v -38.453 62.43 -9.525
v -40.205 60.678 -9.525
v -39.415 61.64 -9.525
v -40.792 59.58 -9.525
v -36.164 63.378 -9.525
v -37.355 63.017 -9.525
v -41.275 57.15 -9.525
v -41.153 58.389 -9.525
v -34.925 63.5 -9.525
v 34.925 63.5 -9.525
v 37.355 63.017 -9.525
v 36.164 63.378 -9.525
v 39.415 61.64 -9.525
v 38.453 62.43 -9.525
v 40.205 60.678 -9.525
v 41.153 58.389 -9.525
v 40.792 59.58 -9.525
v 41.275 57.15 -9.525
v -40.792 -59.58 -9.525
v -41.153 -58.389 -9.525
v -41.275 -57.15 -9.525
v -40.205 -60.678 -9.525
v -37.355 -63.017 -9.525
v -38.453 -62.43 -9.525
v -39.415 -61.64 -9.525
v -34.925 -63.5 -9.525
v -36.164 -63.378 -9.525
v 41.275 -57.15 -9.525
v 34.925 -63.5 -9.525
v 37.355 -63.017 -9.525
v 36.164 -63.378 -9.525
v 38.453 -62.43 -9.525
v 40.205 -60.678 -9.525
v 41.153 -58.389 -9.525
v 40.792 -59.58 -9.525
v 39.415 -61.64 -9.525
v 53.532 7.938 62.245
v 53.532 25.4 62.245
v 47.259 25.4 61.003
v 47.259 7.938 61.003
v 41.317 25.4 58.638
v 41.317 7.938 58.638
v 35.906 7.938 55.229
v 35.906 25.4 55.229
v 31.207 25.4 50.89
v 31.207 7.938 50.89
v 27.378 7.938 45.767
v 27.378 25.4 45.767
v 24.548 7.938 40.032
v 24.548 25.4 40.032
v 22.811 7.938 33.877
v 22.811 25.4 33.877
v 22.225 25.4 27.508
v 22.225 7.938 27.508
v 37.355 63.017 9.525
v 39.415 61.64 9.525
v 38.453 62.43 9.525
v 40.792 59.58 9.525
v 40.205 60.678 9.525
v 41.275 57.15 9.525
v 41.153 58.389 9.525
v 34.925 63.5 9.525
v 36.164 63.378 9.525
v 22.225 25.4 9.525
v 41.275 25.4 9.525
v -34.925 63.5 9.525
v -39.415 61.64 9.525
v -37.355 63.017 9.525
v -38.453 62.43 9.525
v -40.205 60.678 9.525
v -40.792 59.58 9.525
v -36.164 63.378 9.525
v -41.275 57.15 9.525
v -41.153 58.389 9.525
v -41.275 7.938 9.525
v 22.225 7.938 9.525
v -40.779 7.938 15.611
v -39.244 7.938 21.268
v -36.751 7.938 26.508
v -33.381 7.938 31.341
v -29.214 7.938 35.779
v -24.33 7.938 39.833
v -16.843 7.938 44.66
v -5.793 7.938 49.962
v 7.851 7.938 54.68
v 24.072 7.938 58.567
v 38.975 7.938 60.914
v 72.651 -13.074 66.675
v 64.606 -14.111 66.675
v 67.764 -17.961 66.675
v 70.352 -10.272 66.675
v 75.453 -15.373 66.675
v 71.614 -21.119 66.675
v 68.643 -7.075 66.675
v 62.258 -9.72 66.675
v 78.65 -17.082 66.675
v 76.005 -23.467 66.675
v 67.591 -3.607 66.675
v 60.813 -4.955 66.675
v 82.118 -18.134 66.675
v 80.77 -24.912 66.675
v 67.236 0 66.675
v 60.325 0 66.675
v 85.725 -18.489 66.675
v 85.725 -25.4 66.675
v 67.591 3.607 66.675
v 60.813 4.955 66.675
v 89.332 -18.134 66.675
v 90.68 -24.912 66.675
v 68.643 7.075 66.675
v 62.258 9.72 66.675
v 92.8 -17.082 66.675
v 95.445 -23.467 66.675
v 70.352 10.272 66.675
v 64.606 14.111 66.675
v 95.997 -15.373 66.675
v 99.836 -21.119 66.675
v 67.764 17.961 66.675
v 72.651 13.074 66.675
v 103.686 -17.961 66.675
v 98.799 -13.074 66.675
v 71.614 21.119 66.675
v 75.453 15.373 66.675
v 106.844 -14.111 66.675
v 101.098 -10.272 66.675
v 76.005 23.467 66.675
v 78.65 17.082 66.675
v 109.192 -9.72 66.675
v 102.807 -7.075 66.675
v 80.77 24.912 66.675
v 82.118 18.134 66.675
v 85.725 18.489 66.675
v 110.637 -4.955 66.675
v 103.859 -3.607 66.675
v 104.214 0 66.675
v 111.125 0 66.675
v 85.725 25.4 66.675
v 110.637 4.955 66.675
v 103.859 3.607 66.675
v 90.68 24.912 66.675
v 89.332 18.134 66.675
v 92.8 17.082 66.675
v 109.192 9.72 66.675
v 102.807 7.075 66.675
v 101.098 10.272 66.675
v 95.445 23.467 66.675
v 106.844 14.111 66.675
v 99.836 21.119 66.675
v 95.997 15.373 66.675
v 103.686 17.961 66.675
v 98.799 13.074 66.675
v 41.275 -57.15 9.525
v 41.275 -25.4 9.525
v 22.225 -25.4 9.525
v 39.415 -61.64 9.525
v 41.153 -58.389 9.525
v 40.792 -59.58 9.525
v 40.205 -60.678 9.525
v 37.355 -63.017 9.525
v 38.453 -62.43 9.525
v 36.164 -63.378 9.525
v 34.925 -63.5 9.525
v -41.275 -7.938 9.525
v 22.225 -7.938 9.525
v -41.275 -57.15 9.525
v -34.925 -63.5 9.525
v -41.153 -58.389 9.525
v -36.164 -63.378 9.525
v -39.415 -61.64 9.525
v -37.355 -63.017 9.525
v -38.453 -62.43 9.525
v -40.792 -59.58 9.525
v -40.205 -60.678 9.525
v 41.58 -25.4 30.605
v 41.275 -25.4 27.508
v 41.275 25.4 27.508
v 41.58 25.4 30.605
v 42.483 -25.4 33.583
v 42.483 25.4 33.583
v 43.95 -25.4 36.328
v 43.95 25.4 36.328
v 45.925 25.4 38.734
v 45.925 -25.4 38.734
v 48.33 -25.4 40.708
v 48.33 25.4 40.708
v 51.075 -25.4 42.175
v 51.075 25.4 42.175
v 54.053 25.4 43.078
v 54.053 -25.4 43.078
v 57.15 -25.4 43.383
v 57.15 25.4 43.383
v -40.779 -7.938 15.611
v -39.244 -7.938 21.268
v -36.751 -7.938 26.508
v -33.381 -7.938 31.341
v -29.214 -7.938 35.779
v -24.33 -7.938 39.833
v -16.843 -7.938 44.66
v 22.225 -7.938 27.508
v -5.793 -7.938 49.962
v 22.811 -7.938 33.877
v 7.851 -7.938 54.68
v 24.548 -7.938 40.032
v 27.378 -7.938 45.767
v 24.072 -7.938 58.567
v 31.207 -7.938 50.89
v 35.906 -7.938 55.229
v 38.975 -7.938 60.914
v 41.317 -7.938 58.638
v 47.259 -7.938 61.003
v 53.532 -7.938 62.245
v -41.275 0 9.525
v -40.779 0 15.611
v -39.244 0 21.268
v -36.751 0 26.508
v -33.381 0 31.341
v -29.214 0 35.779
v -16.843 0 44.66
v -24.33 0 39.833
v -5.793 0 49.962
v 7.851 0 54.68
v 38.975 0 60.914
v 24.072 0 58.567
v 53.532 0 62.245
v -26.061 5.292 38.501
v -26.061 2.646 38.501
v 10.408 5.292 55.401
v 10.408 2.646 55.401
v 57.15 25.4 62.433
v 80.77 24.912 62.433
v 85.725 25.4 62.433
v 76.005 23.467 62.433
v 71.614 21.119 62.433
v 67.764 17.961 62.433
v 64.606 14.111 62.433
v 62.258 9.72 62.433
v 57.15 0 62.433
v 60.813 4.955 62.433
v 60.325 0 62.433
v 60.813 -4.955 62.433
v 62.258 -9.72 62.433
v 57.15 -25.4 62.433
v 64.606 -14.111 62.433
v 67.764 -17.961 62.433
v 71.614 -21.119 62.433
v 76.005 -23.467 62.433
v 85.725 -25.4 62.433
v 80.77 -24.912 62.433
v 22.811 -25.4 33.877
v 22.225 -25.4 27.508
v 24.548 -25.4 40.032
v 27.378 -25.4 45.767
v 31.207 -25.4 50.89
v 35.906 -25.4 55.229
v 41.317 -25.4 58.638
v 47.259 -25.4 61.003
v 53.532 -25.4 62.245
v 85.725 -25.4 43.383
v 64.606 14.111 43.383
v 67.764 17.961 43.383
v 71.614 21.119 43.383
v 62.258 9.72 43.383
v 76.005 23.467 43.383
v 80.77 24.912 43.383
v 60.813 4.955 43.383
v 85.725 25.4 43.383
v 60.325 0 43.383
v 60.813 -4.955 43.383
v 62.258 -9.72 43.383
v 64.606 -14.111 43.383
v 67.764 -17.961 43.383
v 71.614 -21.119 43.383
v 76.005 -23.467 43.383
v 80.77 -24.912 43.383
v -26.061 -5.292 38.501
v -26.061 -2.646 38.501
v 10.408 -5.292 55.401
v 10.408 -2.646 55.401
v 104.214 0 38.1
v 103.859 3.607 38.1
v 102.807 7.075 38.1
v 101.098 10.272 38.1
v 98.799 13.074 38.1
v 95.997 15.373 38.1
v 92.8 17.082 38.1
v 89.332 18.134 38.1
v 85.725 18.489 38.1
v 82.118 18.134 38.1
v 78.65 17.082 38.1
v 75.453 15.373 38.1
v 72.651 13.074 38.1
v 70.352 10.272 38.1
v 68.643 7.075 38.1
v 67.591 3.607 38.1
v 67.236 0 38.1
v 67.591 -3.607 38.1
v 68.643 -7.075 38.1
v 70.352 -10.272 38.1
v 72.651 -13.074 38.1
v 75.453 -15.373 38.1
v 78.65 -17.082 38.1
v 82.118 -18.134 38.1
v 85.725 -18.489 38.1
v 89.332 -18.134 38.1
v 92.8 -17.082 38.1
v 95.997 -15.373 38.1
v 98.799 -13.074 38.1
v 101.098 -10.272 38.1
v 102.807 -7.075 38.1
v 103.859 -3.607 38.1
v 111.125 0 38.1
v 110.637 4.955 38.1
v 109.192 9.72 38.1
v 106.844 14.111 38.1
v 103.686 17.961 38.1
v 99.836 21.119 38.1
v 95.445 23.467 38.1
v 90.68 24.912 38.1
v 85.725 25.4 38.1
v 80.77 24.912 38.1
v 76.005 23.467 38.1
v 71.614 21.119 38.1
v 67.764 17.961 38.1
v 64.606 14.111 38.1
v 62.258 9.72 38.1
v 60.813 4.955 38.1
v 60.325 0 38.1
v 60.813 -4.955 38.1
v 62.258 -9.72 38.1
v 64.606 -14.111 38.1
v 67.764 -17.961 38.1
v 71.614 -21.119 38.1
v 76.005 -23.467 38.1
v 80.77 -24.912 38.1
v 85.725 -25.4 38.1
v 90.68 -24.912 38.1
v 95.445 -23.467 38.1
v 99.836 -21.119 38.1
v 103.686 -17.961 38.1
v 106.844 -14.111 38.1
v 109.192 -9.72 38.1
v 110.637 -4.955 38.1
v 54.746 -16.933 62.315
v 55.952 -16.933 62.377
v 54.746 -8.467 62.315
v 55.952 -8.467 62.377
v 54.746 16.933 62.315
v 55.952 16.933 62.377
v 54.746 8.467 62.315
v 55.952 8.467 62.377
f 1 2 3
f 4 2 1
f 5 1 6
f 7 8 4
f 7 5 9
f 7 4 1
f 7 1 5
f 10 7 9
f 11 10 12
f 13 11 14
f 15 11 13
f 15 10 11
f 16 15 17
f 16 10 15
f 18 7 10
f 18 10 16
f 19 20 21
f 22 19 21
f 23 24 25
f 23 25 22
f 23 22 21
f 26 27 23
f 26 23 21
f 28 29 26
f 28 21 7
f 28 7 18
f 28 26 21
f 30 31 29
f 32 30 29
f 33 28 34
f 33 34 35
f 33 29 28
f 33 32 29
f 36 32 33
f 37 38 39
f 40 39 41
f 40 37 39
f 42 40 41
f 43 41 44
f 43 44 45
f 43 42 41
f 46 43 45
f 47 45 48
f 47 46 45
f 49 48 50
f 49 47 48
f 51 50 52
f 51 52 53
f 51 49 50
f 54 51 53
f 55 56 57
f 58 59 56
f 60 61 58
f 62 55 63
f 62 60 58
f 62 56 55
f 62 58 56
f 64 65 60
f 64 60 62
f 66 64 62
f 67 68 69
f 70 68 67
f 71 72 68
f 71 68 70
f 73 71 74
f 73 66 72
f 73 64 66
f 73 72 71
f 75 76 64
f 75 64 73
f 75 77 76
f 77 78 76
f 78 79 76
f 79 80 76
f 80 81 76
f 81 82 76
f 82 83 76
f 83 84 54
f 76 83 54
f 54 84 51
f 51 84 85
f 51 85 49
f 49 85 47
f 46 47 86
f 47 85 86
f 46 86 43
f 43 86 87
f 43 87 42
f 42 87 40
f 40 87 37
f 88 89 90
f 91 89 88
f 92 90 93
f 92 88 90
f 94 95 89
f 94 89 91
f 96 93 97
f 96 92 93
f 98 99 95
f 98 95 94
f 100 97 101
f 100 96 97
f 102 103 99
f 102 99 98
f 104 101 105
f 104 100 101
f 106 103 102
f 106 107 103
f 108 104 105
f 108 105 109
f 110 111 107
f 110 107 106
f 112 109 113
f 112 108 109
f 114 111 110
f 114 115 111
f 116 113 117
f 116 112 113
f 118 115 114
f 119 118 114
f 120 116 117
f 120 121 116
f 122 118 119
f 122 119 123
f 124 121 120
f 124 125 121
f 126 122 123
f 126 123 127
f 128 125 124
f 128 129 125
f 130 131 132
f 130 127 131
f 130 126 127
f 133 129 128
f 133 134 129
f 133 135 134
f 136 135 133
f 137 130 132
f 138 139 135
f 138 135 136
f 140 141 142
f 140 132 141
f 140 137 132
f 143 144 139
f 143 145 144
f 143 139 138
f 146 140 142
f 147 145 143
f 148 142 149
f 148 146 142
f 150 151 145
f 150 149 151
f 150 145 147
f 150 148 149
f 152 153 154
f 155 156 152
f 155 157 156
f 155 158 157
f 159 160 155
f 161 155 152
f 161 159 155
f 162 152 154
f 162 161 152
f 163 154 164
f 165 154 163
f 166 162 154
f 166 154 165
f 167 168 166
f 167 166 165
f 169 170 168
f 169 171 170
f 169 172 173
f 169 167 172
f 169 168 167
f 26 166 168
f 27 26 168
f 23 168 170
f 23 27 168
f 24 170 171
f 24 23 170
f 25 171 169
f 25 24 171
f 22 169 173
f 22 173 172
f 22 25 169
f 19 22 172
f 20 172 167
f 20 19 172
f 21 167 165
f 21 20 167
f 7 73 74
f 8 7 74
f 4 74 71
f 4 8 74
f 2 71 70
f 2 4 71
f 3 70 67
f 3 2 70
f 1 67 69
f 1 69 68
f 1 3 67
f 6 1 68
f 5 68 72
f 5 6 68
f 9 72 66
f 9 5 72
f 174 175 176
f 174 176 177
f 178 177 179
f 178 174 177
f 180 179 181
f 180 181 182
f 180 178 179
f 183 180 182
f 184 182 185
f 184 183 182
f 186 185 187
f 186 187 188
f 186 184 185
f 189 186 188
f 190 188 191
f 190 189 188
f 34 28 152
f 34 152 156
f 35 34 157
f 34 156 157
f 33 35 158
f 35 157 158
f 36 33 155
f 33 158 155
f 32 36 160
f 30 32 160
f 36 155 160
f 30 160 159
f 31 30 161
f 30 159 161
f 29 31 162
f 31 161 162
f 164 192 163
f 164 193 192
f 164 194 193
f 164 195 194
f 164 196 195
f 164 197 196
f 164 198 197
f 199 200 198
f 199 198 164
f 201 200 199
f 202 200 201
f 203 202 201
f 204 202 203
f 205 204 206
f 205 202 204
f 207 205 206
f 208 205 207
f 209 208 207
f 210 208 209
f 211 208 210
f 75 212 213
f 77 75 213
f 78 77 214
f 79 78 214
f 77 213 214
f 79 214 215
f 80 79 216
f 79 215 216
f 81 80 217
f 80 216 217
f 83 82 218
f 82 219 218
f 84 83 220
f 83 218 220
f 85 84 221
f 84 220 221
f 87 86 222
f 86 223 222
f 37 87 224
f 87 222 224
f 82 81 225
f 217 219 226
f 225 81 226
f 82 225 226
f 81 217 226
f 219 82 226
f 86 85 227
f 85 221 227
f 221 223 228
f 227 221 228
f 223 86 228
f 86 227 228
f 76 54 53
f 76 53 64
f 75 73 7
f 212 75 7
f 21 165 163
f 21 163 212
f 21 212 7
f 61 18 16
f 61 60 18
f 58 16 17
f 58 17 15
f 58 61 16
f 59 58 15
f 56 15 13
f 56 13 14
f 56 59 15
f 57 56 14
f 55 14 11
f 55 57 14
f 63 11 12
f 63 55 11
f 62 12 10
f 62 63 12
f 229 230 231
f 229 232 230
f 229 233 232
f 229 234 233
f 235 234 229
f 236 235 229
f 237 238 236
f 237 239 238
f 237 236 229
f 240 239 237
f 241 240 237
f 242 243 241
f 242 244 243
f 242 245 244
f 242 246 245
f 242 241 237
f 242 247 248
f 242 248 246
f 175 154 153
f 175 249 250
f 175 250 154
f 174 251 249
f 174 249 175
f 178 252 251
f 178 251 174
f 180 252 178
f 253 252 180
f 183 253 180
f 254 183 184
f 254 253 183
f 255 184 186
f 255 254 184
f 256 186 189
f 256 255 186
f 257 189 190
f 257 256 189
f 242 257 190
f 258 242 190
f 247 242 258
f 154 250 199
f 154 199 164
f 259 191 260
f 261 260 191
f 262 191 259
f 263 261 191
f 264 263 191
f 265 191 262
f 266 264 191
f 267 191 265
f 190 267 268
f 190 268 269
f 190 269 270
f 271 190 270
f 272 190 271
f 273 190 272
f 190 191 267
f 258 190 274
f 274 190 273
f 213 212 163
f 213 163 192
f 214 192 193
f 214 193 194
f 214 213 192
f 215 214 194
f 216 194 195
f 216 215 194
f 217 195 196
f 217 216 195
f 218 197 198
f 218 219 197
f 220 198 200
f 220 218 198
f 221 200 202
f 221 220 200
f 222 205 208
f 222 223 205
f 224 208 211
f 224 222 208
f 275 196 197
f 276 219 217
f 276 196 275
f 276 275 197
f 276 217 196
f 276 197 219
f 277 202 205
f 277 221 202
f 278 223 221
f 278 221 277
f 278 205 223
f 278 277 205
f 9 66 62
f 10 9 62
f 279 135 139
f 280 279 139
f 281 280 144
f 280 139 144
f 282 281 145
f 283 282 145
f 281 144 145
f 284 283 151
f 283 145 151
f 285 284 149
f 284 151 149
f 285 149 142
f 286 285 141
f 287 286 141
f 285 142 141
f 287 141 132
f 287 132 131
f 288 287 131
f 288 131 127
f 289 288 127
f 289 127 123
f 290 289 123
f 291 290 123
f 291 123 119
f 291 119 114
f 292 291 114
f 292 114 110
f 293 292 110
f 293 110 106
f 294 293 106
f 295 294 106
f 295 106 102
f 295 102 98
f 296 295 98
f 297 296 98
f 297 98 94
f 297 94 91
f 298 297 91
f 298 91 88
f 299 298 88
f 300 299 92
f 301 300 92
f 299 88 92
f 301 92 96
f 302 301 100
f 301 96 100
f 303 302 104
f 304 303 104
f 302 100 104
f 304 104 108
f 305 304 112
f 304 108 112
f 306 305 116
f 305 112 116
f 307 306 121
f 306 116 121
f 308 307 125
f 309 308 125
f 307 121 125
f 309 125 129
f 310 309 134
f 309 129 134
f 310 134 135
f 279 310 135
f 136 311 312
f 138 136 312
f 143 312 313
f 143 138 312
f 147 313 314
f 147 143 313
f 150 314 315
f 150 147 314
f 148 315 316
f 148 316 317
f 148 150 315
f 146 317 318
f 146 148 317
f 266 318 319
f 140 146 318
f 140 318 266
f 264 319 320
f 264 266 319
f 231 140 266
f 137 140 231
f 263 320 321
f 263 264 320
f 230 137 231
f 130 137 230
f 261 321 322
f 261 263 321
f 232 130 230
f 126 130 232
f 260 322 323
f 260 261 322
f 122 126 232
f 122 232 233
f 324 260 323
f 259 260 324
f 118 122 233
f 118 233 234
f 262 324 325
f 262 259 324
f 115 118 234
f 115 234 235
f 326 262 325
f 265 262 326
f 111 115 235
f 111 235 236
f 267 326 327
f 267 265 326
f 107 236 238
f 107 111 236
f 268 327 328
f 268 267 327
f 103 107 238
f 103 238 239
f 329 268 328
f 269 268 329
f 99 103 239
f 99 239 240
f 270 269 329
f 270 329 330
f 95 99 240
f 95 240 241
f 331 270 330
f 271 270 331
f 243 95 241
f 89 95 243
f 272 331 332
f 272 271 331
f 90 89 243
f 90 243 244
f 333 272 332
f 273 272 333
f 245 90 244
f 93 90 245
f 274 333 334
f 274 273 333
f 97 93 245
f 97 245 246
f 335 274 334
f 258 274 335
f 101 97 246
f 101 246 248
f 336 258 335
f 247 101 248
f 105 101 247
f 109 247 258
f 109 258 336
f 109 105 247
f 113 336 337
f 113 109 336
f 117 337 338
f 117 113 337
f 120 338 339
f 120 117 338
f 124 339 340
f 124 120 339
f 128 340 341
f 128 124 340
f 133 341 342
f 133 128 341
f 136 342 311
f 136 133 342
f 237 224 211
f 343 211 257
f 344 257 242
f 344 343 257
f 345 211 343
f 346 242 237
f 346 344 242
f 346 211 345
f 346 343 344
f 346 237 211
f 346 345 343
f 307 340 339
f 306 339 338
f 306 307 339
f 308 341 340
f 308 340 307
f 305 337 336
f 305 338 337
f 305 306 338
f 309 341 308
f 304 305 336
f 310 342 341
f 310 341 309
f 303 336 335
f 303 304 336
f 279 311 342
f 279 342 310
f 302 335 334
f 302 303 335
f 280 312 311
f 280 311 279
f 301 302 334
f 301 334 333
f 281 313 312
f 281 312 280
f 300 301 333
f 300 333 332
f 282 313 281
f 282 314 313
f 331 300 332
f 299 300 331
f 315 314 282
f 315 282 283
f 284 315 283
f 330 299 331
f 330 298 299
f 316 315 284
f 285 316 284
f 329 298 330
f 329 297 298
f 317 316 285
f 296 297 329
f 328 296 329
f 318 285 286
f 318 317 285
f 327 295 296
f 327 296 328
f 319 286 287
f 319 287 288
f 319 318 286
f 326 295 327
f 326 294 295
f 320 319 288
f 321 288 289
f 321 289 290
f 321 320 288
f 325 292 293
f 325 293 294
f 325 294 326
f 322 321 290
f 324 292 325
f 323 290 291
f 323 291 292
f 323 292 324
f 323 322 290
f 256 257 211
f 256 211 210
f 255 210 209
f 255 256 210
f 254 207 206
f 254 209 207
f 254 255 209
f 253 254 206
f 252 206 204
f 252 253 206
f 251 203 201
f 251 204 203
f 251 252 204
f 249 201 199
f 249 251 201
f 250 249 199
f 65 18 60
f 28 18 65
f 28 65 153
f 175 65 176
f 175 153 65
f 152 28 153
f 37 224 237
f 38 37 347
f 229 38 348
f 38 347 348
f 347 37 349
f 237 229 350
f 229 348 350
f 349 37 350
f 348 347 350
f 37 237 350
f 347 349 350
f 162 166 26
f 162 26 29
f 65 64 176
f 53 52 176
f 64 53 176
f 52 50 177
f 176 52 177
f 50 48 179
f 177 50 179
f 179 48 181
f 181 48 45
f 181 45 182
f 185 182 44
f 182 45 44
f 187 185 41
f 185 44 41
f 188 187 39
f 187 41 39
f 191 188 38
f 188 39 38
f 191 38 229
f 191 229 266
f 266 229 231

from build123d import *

# Parameters (mm, degrees)
F1_DEPTH = 63.5
F0_W     = 25.4
F0_H     = 19.05
F2_DEPTH = 25.4
F3_DEPTH = 7.9375
F5_R     = 6.35
F6_R     = 18.4889693292
F7_DEPTH = 100.96774064


with BuildPart() as f1:
    # F0 (on Front) → F1 (new body, symmetric)
    with BuildSketch(Plane.XZ):
        Polygon((41.275, -9.525), (41.275, 9.525), (22.225, 9.525), (-41.275, 9.525), (-41.275, -9.525), align=None)
    extrude(amount=F1_DEPTH, both=True)

    # F0 (on Front) → F2 (join, symmetric)
    with BuildSketch(Plane.XZ):
        with BuildLine():
            Line((22.225, 9.525), (41.275, 9.525))
            Line((41.275, 9.525), (41.275, 27.5082))
            ThreePointArc((41.275, 27.5082), (45.9246798487, 38.7335201513), (57.15, 43.3832))
            Line((57.15, 43.3832), (60.325, 43.3832))
            Line((60.325, 43.3832), (60.325, 62.4332))
            Line((60.325, 62.4332), (57.15, 62.4332))
            add(Edge.make_bspline(
                [(53.5324999081, 62.2453460843), (54.7490836223, 62.3182036116), (55.9554653988, 62.3807456949), (57.15, 62.4332)],
                knots=[108.5679461474, 108.5679461474, 108.5679461474, 108.5679461474, 111.7441642872, 111.7441642872, 111.7441642872, 111.7441642872], degree=3))
            ThreePointArc((53.5324999081, 62.2453460843), (31.2068234818, 50.8899710438), (22.225, 27.5082))
            Line((22.225, 27.5082), (22.225, 9.525))
        make_face()
        with Locations((73.025, 52.9082)):
            Rectangle(F0_W, F0_H)
    extrude(amount=F2_DEPTH, both=True)

    # F0 (on Front) → F3 (join, symmetric)
    with BuildSketch(Plane.XZ):
        with BuildLine():
            Line((-41.275, 9.525), (22.225, 9.525))
            Line((22.225, 9.525), (22.225, 27.5082))
            ThreePointArc((22.225, 27.5082), (31.2068234818, 50.8899710438), (53.5324999081, 62.2453460843))
            add(Edge.make_bspline(
                [(-41.275, 9.525), (-41.5565460879, 45.2122684176), (11.9478261389, 59.7549654652), (53.5324999081, 62.2453460843)],
                knots=[0, 0, 0, 0, 108.5679461474, 108.5679461474, 108.5679461474, 108.5679461474], degree=3))
        make_face()
    extrude(amount=F3_DEPTH, both=True)

    # F0 (on Front) → F4 (revolve)
    with BuildSketch(Plane.XZ):
        Polygon((85.725, 62.4332), (85.725, 43.3832), (85.725, 38.1), (111.125, 38.1), (111.125, 66.675), (85.725, 66.675), align=None)
    revolve(axis=Axis((85.725, 0, 52.3875), (0, 0, 1)))

    # F5
    f5_edges = [f1.edges().sort_by_distance(p)[0] for p in [
        (41.275, -63.5, 0),
        (-41.275, -63.5, 0),
        (-41.275, 63.5, 0),
        (41.275, 63.5, 0),
    ]]
    fillet(f5_edges, radius=F5_R)

    # F6 (on face) → F7 (cut)
    with BuildSketch(Plane.XY.offset(66.675)):
        with Locations((85.725, 0)):
            Circle(F6_R)
    extrude(amount=-F7_DEPTH, mode=Mode.SUBTRACT)


solid = f1.part
